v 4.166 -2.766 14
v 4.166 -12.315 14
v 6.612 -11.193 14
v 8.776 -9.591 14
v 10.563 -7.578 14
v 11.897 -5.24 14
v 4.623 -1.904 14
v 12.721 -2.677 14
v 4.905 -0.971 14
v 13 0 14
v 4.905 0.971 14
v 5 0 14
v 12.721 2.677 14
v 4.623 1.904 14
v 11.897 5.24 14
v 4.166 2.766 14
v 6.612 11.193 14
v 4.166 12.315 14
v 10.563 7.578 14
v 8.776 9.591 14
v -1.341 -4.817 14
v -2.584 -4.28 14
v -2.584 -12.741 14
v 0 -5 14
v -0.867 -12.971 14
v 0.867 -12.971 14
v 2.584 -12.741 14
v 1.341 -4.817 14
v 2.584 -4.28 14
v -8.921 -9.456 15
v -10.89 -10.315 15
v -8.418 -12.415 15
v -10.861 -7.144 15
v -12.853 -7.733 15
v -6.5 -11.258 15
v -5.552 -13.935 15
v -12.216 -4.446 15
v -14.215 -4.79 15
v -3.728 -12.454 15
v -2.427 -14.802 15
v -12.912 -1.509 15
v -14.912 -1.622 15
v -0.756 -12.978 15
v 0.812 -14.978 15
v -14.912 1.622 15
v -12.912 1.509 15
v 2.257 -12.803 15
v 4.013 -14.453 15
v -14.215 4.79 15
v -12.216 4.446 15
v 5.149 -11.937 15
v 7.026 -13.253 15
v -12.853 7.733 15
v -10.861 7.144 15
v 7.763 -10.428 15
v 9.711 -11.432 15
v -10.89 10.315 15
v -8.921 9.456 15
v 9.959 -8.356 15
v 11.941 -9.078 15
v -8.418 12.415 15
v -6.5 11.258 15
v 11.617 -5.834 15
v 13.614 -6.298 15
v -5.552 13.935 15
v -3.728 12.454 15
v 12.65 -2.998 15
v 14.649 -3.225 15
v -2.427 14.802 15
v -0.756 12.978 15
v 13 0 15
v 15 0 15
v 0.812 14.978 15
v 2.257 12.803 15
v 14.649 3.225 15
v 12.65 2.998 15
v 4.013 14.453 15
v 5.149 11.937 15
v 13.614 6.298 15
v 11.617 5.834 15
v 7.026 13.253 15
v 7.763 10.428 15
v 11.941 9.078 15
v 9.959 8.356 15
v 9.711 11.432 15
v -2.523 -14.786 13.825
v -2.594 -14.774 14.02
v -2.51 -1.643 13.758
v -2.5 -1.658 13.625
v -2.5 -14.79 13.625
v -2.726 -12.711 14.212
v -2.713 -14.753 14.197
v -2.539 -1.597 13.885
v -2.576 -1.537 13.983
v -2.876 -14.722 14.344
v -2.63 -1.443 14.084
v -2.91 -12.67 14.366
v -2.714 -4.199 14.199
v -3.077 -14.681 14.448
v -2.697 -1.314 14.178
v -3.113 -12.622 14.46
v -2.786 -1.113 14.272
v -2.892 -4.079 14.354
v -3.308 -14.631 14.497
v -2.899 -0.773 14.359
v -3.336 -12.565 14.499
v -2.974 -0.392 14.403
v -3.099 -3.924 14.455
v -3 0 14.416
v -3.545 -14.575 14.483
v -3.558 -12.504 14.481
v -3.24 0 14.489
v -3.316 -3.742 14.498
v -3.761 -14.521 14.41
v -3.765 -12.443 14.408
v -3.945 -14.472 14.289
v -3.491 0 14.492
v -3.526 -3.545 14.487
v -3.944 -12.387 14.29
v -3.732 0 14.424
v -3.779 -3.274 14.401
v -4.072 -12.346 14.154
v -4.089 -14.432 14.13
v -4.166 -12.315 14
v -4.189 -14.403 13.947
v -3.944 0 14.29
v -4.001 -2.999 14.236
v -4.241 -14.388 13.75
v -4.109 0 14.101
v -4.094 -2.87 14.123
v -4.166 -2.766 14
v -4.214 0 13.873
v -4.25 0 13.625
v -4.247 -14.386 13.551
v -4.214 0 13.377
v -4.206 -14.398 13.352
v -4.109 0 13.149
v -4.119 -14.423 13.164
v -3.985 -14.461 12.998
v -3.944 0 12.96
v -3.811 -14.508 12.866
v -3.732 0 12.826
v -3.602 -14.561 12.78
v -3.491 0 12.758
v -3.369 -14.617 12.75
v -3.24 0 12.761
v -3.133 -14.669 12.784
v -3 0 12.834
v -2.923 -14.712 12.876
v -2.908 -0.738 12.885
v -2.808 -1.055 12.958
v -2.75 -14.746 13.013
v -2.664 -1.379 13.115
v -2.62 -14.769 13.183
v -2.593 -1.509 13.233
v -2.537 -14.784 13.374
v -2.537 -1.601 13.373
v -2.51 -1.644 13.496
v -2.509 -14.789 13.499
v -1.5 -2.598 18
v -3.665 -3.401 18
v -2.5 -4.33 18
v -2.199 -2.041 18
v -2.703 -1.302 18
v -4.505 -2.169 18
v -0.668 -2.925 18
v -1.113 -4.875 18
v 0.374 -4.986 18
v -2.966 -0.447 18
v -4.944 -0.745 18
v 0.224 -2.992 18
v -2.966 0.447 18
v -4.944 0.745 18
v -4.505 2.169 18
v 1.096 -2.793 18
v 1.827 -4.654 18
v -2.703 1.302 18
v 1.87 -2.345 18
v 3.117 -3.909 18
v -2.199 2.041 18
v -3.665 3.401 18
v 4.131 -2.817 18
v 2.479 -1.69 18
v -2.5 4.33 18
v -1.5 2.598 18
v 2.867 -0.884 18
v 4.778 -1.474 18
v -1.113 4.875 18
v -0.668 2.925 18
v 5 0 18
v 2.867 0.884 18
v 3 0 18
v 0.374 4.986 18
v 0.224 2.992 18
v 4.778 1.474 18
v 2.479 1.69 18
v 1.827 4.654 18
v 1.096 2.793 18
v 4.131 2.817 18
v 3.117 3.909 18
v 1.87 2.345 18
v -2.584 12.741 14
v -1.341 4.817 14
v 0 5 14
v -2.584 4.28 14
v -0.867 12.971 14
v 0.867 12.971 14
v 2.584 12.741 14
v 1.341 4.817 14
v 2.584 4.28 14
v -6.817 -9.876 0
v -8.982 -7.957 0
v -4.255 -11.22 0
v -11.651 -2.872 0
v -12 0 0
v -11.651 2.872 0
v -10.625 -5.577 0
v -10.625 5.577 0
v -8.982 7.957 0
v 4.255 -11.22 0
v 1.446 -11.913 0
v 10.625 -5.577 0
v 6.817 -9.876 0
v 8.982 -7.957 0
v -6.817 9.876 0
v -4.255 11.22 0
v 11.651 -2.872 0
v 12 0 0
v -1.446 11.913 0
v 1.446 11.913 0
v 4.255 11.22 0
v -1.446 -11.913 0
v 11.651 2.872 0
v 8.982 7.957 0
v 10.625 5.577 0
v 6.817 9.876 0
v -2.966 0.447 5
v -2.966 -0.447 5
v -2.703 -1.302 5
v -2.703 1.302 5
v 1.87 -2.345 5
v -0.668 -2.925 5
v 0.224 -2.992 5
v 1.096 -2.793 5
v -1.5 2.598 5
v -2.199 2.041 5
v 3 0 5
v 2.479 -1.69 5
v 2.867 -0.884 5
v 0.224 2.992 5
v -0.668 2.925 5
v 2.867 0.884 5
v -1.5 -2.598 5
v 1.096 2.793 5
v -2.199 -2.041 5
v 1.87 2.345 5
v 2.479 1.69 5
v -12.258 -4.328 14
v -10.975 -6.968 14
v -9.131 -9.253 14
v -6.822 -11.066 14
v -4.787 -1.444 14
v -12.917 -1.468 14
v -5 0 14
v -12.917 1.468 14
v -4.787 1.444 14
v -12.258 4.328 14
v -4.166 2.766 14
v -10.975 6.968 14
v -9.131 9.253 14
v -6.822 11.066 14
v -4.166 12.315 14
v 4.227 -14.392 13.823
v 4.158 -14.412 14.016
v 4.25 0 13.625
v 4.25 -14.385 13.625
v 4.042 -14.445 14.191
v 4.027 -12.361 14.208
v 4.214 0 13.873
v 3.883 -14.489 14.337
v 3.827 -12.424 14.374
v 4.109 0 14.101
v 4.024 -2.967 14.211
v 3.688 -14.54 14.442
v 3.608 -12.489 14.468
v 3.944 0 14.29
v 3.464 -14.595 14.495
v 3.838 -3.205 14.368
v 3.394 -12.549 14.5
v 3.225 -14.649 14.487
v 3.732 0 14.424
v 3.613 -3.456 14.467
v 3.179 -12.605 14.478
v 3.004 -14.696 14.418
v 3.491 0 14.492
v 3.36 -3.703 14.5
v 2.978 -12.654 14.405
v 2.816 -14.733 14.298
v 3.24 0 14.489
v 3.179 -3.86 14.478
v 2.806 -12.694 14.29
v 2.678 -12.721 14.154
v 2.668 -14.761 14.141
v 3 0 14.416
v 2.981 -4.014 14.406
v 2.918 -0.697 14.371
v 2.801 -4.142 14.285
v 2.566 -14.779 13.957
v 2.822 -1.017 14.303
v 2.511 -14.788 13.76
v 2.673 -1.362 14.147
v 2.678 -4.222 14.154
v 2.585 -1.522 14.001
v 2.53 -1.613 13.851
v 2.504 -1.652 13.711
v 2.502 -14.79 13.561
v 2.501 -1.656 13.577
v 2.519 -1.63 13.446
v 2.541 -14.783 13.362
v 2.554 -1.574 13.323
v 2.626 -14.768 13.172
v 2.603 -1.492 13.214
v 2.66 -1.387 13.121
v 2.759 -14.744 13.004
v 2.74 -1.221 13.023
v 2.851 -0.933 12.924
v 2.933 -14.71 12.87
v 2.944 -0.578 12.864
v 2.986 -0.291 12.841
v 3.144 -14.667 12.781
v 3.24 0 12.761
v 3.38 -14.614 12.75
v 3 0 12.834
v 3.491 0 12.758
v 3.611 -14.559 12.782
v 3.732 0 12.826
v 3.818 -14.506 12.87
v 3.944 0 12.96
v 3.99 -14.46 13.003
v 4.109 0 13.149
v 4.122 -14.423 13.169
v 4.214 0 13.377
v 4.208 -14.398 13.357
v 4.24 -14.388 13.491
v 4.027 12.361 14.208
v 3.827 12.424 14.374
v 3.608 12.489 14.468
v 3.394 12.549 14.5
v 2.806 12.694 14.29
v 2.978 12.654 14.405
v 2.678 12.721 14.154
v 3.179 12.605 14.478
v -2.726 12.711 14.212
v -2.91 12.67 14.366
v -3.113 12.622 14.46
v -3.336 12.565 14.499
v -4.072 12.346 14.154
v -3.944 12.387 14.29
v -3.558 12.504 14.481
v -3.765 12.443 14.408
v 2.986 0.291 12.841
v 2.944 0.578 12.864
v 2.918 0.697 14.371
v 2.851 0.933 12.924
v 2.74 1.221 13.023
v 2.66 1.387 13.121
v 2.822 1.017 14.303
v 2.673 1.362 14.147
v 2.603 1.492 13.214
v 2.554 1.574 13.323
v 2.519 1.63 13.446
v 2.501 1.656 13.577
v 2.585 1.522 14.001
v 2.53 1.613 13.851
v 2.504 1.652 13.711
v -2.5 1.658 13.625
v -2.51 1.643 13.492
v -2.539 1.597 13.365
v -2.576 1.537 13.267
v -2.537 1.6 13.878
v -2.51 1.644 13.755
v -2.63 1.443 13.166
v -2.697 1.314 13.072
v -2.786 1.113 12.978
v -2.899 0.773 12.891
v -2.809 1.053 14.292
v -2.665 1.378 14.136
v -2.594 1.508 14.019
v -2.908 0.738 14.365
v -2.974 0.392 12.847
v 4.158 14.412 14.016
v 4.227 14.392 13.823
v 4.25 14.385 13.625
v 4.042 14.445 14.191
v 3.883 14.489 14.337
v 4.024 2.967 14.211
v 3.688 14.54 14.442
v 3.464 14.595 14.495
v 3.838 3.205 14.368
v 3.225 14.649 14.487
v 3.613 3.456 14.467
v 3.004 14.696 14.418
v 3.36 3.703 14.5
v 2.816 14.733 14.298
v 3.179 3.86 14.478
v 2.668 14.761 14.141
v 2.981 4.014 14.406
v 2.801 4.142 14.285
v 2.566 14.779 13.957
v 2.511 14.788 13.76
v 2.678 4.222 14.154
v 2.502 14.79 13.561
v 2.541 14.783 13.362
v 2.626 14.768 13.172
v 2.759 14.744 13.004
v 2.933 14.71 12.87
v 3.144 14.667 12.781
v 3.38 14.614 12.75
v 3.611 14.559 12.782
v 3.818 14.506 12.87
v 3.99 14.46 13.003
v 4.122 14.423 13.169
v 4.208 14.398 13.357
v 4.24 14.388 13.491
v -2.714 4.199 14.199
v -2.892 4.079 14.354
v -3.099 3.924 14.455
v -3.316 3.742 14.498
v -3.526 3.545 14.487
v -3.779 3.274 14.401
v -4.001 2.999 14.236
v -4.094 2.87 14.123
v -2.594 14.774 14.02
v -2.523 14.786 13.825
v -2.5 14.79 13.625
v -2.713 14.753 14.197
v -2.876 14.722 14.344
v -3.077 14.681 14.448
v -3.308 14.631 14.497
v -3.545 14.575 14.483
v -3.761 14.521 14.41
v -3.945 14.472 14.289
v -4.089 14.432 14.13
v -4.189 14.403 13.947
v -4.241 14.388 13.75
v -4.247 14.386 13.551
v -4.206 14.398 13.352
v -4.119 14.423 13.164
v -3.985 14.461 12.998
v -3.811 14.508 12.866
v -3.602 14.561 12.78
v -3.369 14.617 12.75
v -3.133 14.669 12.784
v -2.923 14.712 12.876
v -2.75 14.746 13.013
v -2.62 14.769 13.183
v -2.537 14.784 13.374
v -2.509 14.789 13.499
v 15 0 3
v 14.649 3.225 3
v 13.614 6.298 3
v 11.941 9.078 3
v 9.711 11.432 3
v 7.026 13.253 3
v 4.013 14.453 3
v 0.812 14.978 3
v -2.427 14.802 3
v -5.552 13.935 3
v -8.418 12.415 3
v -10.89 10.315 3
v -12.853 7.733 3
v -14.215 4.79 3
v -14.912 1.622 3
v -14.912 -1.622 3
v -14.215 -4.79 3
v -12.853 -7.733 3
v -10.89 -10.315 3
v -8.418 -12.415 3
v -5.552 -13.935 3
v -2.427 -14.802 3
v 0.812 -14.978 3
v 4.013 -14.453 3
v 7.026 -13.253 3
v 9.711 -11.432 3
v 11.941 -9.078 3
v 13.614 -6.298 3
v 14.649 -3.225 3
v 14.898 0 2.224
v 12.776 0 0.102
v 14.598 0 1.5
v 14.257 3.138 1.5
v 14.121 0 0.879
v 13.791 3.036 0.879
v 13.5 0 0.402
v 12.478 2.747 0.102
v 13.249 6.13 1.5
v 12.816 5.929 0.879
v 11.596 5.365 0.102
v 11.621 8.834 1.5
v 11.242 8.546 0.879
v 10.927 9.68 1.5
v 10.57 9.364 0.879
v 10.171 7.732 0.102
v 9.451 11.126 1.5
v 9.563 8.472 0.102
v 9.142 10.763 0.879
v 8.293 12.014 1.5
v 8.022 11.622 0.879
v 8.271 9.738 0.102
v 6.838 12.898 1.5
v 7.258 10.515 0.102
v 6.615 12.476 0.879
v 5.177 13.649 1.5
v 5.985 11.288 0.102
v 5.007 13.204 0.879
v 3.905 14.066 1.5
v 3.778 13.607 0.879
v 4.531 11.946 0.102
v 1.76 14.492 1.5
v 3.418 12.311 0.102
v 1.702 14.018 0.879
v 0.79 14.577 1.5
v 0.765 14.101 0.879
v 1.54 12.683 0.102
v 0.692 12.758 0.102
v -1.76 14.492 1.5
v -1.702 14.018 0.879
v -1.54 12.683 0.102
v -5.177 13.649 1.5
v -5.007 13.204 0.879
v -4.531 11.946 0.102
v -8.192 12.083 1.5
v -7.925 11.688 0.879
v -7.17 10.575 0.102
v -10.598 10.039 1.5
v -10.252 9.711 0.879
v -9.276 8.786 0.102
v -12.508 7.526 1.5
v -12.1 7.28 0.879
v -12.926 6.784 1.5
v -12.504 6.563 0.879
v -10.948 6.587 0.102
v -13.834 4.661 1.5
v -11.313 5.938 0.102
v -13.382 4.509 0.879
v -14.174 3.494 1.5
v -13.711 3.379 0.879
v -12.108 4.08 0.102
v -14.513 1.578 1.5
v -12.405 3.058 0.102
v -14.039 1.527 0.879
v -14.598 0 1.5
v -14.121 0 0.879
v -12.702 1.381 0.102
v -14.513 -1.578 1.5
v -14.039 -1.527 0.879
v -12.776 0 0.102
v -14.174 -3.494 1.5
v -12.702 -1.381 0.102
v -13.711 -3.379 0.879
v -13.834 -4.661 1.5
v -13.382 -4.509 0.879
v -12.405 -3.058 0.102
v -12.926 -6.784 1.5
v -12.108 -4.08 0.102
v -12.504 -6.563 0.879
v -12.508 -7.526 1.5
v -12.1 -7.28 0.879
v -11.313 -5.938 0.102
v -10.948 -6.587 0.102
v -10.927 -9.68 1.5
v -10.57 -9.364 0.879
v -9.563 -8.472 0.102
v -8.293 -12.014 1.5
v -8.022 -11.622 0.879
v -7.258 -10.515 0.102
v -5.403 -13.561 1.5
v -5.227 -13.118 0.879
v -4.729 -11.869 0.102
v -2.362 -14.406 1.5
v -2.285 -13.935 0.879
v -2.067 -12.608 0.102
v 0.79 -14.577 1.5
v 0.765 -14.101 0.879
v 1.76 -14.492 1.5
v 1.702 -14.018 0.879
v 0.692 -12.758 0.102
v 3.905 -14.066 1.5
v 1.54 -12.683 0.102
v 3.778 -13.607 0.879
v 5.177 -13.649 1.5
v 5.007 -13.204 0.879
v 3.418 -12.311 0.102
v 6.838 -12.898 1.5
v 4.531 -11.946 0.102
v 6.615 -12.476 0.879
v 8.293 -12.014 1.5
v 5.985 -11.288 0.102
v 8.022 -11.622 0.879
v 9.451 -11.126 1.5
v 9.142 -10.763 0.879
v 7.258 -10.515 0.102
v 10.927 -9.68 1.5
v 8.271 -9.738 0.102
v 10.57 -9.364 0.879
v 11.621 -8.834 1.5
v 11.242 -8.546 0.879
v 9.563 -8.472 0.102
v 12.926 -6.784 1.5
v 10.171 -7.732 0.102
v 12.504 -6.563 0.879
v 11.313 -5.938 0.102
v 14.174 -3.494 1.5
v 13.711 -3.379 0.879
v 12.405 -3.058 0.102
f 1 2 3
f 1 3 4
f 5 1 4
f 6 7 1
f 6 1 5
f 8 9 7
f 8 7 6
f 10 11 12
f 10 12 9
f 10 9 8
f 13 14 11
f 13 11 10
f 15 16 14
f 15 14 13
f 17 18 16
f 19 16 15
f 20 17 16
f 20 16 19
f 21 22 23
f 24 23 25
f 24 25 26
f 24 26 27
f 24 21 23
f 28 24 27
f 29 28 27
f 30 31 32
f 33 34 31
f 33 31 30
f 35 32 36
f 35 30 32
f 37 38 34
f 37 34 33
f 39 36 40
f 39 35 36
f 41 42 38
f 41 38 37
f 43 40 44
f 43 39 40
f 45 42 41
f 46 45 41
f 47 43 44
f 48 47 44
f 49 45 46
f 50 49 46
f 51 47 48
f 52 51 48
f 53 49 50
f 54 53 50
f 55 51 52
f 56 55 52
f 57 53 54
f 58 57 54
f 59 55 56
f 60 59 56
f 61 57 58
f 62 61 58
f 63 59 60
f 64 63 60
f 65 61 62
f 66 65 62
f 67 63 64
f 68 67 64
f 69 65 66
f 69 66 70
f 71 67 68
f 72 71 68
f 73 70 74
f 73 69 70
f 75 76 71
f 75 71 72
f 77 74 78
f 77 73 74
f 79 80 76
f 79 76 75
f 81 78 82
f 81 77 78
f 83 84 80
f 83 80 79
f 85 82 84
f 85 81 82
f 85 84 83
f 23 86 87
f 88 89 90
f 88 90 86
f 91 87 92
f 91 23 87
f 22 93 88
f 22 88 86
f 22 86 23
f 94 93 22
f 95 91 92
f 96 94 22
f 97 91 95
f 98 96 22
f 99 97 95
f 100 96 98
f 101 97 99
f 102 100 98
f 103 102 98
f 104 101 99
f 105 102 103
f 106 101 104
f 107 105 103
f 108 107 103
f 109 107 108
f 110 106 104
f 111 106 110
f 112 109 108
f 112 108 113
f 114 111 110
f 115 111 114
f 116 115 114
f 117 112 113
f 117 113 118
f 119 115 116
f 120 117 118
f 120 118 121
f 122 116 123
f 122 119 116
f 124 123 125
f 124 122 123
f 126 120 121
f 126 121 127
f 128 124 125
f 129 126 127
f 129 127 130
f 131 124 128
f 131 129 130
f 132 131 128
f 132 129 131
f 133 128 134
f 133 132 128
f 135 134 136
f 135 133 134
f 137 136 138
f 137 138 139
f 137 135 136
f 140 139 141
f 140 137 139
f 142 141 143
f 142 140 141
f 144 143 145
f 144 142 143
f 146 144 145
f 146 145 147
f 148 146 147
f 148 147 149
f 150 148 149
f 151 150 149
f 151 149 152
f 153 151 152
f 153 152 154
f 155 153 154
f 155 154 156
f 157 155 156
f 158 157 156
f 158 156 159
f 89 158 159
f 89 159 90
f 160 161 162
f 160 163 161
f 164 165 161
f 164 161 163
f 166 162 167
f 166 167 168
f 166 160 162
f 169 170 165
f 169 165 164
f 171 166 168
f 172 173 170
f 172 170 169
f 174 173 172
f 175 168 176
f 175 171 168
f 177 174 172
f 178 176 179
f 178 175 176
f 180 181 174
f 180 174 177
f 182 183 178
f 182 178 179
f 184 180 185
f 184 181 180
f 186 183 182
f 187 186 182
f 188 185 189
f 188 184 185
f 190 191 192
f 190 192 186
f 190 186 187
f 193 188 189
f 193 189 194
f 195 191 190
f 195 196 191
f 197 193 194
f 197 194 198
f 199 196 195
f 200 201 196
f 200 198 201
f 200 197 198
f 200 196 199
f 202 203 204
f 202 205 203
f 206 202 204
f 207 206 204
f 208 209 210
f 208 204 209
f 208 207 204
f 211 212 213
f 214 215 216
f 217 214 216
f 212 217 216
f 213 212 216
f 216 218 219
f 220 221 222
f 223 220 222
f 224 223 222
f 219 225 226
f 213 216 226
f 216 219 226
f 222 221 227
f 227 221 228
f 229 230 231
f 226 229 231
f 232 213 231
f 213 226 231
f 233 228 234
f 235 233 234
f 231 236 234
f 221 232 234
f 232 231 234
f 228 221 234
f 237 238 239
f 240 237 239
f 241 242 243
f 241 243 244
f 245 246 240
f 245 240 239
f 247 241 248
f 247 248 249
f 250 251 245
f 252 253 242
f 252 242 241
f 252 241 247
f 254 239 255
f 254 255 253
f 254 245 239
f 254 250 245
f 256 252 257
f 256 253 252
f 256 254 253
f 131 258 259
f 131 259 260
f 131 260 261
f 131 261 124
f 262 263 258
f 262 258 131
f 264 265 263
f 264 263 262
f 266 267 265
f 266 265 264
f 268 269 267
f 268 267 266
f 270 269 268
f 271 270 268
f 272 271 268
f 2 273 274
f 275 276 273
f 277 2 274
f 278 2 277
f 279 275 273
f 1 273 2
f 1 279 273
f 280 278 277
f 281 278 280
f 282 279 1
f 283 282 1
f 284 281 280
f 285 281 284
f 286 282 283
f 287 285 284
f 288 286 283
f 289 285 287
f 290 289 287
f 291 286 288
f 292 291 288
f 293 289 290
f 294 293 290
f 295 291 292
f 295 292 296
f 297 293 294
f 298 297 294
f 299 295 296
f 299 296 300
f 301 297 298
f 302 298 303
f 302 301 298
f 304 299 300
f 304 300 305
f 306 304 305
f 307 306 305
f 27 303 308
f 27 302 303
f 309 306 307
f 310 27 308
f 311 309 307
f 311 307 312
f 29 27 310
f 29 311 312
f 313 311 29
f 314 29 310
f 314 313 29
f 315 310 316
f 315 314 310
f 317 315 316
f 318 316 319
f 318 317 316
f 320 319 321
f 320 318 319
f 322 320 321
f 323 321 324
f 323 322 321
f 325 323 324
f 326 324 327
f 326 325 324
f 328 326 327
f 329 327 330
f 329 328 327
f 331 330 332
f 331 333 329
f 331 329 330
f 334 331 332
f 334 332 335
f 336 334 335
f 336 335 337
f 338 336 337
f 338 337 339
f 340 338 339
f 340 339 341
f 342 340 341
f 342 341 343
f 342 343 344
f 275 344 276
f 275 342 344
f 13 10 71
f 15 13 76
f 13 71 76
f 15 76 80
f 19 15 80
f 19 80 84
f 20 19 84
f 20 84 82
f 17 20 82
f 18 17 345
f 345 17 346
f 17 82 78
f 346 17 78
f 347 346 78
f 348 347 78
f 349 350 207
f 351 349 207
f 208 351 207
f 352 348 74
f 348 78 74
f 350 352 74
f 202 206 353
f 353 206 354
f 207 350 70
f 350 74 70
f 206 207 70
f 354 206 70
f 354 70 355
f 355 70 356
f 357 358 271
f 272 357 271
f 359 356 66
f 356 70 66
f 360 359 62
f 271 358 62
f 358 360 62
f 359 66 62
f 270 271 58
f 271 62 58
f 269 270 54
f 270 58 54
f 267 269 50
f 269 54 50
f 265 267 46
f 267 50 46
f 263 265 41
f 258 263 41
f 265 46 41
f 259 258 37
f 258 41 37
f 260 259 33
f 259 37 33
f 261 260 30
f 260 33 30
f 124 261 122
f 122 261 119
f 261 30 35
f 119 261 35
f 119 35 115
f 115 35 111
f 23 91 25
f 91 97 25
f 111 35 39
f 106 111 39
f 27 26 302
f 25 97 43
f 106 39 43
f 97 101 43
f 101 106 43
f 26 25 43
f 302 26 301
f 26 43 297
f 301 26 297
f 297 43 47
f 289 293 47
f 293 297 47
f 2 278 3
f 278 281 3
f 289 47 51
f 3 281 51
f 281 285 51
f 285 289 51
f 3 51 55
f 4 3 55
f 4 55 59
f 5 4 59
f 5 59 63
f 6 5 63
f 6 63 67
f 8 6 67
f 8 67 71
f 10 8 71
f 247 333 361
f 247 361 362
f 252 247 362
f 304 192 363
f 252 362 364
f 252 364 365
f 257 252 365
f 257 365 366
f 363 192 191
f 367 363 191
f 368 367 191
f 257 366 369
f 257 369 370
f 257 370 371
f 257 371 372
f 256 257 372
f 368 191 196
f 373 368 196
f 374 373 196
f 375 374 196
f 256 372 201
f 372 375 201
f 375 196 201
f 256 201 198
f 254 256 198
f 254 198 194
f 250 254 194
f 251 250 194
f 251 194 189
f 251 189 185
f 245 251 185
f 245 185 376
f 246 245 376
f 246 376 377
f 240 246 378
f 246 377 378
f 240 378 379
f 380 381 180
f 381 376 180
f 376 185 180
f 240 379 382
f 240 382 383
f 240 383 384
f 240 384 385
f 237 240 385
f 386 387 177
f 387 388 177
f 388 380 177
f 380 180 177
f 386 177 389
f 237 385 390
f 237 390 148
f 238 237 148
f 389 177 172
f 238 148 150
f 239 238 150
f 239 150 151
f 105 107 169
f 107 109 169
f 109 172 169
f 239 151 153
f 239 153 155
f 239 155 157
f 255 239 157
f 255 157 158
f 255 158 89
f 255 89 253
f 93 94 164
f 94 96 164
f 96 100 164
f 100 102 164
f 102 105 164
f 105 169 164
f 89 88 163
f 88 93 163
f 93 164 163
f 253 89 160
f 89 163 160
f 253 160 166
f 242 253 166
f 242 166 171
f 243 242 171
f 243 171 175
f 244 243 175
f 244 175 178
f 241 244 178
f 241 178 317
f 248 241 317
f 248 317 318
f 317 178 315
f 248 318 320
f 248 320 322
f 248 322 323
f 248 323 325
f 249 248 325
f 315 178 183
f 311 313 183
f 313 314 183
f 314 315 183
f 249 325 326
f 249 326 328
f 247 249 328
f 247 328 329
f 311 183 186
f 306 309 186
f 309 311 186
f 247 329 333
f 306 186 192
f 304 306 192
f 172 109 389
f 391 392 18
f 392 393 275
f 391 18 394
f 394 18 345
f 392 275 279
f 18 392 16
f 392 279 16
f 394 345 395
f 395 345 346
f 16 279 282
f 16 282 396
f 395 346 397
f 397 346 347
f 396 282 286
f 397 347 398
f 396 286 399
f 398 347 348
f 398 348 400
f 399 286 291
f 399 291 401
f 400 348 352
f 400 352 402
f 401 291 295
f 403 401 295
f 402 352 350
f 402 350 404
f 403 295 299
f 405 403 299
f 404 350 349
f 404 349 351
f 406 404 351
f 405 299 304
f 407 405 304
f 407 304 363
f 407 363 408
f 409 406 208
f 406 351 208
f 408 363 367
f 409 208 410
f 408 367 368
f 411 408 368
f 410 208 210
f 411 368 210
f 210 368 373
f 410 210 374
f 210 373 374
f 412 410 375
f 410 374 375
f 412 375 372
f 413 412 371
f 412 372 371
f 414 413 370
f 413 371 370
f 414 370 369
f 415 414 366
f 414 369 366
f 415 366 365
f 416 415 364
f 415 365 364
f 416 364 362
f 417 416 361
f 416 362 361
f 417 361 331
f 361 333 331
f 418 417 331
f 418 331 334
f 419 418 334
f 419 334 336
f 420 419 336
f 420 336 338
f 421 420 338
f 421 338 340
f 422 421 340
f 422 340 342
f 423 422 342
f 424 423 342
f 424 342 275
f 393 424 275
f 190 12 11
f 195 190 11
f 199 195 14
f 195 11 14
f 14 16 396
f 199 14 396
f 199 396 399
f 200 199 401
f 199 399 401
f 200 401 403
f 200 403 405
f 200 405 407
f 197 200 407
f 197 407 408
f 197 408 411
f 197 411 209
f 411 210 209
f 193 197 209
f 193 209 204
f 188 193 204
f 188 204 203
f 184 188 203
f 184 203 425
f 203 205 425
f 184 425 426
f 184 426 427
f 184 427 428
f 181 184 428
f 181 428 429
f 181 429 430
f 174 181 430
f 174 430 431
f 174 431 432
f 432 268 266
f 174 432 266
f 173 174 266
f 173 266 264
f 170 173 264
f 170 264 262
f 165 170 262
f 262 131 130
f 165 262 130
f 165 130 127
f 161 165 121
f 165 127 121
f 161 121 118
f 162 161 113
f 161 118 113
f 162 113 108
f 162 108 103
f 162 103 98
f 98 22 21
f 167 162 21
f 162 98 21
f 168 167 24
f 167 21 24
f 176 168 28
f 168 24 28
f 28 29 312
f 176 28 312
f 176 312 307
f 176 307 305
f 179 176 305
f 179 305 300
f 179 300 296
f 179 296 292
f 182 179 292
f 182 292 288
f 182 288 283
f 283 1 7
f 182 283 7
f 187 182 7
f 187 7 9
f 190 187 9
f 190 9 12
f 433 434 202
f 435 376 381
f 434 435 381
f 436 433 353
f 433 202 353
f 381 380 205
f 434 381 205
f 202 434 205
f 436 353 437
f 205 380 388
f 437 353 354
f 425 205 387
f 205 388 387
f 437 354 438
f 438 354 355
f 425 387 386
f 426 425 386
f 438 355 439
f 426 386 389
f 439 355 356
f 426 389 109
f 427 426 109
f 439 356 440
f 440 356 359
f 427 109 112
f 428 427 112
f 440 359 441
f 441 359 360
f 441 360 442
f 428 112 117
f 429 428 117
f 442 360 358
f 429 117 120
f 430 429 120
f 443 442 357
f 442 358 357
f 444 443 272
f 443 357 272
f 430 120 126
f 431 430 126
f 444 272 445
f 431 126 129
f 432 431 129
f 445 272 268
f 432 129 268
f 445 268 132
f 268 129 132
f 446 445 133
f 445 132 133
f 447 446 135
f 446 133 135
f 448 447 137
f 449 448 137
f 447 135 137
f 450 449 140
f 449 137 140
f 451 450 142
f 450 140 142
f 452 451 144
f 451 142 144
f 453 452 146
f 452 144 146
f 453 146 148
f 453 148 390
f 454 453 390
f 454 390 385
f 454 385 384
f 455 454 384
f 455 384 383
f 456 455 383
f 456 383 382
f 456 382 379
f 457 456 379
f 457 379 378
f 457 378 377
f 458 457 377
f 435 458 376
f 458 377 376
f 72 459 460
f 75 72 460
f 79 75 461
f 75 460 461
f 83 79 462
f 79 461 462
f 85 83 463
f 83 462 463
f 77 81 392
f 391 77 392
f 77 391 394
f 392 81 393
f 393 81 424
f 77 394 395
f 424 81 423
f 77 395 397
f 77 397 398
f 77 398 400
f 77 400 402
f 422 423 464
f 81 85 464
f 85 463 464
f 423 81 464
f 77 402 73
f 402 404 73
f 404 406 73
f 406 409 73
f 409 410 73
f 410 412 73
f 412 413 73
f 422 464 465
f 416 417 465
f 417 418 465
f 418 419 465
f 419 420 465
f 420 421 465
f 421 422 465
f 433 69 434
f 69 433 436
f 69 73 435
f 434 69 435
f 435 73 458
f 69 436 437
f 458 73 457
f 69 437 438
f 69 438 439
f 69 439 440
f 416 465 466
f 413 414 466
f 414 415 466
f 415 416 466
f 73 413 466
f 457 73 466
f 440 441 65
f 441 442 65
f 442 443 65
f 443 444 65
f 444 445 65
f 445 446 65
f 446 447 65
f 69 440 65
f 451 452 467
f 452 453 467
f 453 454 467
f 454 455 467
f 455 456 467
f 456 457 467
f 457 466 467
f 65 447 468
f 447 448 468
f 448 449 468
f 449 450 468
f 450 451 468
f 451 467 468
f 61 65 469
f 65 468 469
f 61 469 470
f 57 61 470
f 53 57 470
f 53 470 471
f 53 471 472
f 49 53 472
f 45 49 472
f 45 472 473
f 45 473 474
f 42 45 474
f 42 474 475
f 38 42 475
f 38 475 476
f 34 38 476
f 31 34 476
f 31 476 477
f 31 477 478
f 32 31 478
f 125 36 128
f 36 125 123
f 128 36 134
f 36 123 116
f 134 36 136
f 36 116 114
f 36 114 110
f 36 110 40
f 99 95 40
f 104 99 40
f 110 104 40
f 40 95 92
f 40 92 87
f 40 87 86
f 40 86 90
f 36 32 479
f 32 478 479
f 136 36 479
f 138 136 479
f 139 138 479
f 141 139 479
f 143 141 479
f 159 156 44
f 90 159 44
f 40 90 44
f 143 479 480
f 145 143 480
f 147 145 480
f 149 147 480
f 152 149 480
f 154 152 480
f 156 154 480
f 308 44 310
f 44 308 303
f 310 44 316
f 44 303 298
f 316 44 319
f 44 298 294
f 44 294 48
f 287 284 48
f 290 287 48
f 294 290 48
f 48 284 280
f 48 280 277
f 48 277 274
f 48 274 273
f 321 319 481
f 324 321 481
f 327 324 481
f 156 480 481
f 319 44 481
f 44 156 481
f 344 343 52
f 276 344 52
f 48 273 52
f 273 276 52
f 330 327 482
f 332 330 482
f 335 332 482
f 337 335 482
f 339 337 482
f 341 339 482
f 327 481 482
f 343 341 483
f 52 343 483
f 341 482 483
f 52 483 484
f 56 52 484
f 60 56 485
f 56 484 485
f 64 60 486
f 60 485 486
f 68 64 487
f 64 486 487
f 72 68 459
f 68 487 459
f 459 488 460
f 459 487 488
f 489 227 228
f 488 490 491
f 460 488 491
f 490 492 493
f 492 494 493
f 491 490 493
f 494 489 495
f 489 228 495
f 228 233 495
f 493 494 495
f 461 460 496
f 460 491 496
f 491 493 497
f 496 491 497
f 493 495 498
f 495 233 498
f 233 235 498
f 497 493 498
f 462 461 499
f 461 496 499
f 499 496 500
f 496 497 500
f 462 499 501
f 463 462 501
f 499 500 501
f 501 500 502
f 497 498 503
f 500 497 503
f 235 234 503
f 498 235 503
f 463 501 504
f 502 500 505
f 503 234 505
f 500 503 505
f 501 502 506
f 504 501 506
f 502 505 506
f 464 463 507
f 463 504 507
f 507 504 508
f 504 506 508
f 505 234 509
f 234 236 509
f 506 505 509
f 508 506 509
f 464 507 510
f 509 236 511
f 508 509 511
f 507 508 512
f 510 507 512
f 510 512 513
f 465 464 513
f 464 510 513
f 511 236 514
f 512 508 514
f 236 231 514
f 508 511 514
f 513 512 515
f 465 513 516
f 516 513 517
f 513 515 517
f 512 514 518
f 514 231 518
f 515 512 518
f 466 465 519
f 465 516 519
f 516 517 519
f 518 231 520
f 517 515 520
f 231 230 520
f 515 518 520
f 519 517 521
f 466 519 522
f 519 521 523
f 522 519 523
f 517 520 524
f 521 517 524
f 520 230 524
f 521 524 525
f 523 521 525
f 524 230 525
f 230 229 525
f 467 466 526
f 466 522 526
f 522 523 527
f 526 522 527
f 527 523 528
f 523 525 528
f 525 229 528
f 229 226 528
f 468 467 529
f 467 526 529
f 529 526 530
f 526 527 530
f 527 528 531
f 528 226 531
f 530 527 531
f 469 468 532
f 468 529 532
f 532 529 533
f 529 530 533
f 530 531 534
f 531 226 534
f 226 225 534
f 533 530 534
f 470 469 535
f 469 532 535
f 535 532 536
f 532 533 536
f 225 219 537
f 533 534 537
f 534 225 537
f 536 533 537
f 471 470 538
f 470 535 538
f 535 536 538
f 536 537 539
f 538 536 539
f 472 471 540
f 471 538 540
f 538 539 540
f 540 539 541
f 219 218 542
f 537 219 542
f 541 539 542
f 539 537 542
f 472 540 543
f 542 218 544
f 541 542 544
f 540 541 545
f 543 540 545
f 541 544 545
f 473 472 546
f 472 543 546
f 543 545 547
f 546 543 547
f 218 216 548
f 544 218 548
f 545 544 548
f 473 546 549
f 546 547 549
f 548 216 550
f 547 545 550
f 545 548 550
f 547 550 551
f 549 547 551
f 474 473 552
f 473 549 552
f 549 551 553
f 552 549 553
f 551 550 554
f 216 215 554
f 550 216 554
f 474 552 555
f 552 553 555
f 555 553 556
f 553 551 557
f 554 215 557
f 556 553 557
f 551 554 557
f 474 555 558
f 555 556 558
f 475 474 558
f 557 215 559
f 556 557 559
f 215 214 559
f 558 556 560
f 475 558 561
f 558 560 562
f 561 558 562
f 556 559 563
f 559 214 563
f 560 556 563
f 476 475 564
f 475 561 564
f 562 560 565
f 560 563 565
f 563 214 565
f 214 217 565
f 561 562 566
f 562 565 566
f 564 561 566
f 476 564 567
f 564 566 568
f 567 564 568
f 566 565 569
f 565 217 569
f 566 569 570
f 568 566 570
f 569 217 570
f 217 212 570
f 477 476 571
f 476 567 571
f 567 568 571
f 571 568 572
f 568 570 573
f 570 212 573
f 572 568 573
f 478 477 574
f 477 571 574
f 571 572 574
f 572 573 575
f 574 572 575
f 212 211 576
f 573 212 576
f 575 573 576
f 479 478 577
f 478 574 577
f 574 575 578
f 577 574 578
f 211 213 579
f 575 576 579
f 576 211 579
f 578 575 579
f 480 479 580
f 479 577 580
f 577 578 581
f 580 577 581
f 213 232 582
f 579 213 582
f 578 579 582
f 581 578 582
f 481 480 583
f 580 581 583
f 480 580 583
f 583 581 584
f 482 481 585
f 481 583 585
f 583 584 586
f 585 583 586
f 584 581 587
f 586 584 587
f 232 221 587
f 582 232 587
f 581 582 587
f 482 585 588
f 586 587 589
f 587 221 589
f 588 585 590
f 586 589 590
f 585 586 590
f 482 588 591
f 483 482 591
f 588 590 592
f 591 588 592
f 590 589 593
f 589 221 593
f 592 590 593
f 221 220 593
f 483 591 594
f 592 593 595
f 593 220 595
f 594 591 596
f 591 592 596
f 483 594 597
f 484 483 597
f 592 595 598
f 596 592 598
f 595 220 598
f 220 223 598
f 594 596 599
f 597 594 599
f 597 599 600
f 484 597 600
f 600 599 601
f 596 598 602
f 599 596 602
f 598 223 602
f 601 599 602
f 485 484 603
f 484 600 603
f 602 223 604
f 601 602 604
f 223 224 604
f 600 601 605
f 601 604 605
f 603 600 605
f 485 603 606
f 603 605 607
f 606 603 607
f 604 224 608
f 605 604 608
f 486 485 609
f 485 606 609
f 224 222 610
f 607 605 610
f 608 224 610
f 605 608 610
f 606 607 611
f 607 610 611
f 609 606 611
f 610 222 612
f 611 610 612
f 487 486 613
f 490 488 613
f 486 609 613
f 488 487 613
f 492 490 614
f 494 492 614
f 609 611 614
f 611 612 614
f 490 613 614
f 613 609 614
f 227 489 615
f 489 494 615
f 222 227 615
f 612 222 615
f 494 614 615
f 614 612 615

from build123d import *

# Parameters (mm, degrees)
F0_R           = 15
F1_DEPTH       = 15
F2_R           = 13
F3_DEPTH       = 1
F4_R           = 5
F5_DEPTH       = 4
F6_R           = 3
F7_DEPTH       = 13
F8_R           = 3
F9_R           = 0.875
F10_DEPTH      = 15.001
F10_DEPTH_BACK = 15.001


with BuildPart() as f1:
    # F0 (on Top) → F1 (new body)
    with BuildSketch(Plane.XY):
        Circle(F0_R)
    extrude(amount=F1_DEPTH)

    # F2 (on face) → F3 (cut)
    with BuildSketch(Plane.XY.offset(15)):
        Circle(F2_R)
    extrude(amount=-F3_DEPTH, mode=Mode.SUBTRACT)

    # F4 (on face) → F5 (join)
    with BuildSketch(Plane.XY.offset(14)):
        Circle(F4_R)
    extrude(amount=F5_DEPTH)

    # F6 (on face) → F7 (cut)
    with BuildSketch(Plane.XY.offset(18)):
        Circle(F6_R)
    extrude(amount=-F7_DEPTH, mode=Mode.SUBTRACT)

    # F8
    f8_edges = [f1.edges().sort_by_distance(p)[0] for p in [
        (-15, 0, 0),
    ]]
    fillet(f8_edges, radius=F8_R)

    # F9 (on Front) → F10 (cut, two sides)
    with BuildSketch(Plane.XZ) as f10_sk:
        with Locations((-3.375, 13.625)):
            Circle(F9_R)
        with Locations((3.375, 13.625)):
            Circle(F9_R)
    extrude(amount=-F10_DEPTH, mode=Mode.SUBTRACT)
    extrude(f10_sk.sketch, amount=F10_DEPTH_BACK, mode=Mode.SUBTRACT)


solid = f1.part
